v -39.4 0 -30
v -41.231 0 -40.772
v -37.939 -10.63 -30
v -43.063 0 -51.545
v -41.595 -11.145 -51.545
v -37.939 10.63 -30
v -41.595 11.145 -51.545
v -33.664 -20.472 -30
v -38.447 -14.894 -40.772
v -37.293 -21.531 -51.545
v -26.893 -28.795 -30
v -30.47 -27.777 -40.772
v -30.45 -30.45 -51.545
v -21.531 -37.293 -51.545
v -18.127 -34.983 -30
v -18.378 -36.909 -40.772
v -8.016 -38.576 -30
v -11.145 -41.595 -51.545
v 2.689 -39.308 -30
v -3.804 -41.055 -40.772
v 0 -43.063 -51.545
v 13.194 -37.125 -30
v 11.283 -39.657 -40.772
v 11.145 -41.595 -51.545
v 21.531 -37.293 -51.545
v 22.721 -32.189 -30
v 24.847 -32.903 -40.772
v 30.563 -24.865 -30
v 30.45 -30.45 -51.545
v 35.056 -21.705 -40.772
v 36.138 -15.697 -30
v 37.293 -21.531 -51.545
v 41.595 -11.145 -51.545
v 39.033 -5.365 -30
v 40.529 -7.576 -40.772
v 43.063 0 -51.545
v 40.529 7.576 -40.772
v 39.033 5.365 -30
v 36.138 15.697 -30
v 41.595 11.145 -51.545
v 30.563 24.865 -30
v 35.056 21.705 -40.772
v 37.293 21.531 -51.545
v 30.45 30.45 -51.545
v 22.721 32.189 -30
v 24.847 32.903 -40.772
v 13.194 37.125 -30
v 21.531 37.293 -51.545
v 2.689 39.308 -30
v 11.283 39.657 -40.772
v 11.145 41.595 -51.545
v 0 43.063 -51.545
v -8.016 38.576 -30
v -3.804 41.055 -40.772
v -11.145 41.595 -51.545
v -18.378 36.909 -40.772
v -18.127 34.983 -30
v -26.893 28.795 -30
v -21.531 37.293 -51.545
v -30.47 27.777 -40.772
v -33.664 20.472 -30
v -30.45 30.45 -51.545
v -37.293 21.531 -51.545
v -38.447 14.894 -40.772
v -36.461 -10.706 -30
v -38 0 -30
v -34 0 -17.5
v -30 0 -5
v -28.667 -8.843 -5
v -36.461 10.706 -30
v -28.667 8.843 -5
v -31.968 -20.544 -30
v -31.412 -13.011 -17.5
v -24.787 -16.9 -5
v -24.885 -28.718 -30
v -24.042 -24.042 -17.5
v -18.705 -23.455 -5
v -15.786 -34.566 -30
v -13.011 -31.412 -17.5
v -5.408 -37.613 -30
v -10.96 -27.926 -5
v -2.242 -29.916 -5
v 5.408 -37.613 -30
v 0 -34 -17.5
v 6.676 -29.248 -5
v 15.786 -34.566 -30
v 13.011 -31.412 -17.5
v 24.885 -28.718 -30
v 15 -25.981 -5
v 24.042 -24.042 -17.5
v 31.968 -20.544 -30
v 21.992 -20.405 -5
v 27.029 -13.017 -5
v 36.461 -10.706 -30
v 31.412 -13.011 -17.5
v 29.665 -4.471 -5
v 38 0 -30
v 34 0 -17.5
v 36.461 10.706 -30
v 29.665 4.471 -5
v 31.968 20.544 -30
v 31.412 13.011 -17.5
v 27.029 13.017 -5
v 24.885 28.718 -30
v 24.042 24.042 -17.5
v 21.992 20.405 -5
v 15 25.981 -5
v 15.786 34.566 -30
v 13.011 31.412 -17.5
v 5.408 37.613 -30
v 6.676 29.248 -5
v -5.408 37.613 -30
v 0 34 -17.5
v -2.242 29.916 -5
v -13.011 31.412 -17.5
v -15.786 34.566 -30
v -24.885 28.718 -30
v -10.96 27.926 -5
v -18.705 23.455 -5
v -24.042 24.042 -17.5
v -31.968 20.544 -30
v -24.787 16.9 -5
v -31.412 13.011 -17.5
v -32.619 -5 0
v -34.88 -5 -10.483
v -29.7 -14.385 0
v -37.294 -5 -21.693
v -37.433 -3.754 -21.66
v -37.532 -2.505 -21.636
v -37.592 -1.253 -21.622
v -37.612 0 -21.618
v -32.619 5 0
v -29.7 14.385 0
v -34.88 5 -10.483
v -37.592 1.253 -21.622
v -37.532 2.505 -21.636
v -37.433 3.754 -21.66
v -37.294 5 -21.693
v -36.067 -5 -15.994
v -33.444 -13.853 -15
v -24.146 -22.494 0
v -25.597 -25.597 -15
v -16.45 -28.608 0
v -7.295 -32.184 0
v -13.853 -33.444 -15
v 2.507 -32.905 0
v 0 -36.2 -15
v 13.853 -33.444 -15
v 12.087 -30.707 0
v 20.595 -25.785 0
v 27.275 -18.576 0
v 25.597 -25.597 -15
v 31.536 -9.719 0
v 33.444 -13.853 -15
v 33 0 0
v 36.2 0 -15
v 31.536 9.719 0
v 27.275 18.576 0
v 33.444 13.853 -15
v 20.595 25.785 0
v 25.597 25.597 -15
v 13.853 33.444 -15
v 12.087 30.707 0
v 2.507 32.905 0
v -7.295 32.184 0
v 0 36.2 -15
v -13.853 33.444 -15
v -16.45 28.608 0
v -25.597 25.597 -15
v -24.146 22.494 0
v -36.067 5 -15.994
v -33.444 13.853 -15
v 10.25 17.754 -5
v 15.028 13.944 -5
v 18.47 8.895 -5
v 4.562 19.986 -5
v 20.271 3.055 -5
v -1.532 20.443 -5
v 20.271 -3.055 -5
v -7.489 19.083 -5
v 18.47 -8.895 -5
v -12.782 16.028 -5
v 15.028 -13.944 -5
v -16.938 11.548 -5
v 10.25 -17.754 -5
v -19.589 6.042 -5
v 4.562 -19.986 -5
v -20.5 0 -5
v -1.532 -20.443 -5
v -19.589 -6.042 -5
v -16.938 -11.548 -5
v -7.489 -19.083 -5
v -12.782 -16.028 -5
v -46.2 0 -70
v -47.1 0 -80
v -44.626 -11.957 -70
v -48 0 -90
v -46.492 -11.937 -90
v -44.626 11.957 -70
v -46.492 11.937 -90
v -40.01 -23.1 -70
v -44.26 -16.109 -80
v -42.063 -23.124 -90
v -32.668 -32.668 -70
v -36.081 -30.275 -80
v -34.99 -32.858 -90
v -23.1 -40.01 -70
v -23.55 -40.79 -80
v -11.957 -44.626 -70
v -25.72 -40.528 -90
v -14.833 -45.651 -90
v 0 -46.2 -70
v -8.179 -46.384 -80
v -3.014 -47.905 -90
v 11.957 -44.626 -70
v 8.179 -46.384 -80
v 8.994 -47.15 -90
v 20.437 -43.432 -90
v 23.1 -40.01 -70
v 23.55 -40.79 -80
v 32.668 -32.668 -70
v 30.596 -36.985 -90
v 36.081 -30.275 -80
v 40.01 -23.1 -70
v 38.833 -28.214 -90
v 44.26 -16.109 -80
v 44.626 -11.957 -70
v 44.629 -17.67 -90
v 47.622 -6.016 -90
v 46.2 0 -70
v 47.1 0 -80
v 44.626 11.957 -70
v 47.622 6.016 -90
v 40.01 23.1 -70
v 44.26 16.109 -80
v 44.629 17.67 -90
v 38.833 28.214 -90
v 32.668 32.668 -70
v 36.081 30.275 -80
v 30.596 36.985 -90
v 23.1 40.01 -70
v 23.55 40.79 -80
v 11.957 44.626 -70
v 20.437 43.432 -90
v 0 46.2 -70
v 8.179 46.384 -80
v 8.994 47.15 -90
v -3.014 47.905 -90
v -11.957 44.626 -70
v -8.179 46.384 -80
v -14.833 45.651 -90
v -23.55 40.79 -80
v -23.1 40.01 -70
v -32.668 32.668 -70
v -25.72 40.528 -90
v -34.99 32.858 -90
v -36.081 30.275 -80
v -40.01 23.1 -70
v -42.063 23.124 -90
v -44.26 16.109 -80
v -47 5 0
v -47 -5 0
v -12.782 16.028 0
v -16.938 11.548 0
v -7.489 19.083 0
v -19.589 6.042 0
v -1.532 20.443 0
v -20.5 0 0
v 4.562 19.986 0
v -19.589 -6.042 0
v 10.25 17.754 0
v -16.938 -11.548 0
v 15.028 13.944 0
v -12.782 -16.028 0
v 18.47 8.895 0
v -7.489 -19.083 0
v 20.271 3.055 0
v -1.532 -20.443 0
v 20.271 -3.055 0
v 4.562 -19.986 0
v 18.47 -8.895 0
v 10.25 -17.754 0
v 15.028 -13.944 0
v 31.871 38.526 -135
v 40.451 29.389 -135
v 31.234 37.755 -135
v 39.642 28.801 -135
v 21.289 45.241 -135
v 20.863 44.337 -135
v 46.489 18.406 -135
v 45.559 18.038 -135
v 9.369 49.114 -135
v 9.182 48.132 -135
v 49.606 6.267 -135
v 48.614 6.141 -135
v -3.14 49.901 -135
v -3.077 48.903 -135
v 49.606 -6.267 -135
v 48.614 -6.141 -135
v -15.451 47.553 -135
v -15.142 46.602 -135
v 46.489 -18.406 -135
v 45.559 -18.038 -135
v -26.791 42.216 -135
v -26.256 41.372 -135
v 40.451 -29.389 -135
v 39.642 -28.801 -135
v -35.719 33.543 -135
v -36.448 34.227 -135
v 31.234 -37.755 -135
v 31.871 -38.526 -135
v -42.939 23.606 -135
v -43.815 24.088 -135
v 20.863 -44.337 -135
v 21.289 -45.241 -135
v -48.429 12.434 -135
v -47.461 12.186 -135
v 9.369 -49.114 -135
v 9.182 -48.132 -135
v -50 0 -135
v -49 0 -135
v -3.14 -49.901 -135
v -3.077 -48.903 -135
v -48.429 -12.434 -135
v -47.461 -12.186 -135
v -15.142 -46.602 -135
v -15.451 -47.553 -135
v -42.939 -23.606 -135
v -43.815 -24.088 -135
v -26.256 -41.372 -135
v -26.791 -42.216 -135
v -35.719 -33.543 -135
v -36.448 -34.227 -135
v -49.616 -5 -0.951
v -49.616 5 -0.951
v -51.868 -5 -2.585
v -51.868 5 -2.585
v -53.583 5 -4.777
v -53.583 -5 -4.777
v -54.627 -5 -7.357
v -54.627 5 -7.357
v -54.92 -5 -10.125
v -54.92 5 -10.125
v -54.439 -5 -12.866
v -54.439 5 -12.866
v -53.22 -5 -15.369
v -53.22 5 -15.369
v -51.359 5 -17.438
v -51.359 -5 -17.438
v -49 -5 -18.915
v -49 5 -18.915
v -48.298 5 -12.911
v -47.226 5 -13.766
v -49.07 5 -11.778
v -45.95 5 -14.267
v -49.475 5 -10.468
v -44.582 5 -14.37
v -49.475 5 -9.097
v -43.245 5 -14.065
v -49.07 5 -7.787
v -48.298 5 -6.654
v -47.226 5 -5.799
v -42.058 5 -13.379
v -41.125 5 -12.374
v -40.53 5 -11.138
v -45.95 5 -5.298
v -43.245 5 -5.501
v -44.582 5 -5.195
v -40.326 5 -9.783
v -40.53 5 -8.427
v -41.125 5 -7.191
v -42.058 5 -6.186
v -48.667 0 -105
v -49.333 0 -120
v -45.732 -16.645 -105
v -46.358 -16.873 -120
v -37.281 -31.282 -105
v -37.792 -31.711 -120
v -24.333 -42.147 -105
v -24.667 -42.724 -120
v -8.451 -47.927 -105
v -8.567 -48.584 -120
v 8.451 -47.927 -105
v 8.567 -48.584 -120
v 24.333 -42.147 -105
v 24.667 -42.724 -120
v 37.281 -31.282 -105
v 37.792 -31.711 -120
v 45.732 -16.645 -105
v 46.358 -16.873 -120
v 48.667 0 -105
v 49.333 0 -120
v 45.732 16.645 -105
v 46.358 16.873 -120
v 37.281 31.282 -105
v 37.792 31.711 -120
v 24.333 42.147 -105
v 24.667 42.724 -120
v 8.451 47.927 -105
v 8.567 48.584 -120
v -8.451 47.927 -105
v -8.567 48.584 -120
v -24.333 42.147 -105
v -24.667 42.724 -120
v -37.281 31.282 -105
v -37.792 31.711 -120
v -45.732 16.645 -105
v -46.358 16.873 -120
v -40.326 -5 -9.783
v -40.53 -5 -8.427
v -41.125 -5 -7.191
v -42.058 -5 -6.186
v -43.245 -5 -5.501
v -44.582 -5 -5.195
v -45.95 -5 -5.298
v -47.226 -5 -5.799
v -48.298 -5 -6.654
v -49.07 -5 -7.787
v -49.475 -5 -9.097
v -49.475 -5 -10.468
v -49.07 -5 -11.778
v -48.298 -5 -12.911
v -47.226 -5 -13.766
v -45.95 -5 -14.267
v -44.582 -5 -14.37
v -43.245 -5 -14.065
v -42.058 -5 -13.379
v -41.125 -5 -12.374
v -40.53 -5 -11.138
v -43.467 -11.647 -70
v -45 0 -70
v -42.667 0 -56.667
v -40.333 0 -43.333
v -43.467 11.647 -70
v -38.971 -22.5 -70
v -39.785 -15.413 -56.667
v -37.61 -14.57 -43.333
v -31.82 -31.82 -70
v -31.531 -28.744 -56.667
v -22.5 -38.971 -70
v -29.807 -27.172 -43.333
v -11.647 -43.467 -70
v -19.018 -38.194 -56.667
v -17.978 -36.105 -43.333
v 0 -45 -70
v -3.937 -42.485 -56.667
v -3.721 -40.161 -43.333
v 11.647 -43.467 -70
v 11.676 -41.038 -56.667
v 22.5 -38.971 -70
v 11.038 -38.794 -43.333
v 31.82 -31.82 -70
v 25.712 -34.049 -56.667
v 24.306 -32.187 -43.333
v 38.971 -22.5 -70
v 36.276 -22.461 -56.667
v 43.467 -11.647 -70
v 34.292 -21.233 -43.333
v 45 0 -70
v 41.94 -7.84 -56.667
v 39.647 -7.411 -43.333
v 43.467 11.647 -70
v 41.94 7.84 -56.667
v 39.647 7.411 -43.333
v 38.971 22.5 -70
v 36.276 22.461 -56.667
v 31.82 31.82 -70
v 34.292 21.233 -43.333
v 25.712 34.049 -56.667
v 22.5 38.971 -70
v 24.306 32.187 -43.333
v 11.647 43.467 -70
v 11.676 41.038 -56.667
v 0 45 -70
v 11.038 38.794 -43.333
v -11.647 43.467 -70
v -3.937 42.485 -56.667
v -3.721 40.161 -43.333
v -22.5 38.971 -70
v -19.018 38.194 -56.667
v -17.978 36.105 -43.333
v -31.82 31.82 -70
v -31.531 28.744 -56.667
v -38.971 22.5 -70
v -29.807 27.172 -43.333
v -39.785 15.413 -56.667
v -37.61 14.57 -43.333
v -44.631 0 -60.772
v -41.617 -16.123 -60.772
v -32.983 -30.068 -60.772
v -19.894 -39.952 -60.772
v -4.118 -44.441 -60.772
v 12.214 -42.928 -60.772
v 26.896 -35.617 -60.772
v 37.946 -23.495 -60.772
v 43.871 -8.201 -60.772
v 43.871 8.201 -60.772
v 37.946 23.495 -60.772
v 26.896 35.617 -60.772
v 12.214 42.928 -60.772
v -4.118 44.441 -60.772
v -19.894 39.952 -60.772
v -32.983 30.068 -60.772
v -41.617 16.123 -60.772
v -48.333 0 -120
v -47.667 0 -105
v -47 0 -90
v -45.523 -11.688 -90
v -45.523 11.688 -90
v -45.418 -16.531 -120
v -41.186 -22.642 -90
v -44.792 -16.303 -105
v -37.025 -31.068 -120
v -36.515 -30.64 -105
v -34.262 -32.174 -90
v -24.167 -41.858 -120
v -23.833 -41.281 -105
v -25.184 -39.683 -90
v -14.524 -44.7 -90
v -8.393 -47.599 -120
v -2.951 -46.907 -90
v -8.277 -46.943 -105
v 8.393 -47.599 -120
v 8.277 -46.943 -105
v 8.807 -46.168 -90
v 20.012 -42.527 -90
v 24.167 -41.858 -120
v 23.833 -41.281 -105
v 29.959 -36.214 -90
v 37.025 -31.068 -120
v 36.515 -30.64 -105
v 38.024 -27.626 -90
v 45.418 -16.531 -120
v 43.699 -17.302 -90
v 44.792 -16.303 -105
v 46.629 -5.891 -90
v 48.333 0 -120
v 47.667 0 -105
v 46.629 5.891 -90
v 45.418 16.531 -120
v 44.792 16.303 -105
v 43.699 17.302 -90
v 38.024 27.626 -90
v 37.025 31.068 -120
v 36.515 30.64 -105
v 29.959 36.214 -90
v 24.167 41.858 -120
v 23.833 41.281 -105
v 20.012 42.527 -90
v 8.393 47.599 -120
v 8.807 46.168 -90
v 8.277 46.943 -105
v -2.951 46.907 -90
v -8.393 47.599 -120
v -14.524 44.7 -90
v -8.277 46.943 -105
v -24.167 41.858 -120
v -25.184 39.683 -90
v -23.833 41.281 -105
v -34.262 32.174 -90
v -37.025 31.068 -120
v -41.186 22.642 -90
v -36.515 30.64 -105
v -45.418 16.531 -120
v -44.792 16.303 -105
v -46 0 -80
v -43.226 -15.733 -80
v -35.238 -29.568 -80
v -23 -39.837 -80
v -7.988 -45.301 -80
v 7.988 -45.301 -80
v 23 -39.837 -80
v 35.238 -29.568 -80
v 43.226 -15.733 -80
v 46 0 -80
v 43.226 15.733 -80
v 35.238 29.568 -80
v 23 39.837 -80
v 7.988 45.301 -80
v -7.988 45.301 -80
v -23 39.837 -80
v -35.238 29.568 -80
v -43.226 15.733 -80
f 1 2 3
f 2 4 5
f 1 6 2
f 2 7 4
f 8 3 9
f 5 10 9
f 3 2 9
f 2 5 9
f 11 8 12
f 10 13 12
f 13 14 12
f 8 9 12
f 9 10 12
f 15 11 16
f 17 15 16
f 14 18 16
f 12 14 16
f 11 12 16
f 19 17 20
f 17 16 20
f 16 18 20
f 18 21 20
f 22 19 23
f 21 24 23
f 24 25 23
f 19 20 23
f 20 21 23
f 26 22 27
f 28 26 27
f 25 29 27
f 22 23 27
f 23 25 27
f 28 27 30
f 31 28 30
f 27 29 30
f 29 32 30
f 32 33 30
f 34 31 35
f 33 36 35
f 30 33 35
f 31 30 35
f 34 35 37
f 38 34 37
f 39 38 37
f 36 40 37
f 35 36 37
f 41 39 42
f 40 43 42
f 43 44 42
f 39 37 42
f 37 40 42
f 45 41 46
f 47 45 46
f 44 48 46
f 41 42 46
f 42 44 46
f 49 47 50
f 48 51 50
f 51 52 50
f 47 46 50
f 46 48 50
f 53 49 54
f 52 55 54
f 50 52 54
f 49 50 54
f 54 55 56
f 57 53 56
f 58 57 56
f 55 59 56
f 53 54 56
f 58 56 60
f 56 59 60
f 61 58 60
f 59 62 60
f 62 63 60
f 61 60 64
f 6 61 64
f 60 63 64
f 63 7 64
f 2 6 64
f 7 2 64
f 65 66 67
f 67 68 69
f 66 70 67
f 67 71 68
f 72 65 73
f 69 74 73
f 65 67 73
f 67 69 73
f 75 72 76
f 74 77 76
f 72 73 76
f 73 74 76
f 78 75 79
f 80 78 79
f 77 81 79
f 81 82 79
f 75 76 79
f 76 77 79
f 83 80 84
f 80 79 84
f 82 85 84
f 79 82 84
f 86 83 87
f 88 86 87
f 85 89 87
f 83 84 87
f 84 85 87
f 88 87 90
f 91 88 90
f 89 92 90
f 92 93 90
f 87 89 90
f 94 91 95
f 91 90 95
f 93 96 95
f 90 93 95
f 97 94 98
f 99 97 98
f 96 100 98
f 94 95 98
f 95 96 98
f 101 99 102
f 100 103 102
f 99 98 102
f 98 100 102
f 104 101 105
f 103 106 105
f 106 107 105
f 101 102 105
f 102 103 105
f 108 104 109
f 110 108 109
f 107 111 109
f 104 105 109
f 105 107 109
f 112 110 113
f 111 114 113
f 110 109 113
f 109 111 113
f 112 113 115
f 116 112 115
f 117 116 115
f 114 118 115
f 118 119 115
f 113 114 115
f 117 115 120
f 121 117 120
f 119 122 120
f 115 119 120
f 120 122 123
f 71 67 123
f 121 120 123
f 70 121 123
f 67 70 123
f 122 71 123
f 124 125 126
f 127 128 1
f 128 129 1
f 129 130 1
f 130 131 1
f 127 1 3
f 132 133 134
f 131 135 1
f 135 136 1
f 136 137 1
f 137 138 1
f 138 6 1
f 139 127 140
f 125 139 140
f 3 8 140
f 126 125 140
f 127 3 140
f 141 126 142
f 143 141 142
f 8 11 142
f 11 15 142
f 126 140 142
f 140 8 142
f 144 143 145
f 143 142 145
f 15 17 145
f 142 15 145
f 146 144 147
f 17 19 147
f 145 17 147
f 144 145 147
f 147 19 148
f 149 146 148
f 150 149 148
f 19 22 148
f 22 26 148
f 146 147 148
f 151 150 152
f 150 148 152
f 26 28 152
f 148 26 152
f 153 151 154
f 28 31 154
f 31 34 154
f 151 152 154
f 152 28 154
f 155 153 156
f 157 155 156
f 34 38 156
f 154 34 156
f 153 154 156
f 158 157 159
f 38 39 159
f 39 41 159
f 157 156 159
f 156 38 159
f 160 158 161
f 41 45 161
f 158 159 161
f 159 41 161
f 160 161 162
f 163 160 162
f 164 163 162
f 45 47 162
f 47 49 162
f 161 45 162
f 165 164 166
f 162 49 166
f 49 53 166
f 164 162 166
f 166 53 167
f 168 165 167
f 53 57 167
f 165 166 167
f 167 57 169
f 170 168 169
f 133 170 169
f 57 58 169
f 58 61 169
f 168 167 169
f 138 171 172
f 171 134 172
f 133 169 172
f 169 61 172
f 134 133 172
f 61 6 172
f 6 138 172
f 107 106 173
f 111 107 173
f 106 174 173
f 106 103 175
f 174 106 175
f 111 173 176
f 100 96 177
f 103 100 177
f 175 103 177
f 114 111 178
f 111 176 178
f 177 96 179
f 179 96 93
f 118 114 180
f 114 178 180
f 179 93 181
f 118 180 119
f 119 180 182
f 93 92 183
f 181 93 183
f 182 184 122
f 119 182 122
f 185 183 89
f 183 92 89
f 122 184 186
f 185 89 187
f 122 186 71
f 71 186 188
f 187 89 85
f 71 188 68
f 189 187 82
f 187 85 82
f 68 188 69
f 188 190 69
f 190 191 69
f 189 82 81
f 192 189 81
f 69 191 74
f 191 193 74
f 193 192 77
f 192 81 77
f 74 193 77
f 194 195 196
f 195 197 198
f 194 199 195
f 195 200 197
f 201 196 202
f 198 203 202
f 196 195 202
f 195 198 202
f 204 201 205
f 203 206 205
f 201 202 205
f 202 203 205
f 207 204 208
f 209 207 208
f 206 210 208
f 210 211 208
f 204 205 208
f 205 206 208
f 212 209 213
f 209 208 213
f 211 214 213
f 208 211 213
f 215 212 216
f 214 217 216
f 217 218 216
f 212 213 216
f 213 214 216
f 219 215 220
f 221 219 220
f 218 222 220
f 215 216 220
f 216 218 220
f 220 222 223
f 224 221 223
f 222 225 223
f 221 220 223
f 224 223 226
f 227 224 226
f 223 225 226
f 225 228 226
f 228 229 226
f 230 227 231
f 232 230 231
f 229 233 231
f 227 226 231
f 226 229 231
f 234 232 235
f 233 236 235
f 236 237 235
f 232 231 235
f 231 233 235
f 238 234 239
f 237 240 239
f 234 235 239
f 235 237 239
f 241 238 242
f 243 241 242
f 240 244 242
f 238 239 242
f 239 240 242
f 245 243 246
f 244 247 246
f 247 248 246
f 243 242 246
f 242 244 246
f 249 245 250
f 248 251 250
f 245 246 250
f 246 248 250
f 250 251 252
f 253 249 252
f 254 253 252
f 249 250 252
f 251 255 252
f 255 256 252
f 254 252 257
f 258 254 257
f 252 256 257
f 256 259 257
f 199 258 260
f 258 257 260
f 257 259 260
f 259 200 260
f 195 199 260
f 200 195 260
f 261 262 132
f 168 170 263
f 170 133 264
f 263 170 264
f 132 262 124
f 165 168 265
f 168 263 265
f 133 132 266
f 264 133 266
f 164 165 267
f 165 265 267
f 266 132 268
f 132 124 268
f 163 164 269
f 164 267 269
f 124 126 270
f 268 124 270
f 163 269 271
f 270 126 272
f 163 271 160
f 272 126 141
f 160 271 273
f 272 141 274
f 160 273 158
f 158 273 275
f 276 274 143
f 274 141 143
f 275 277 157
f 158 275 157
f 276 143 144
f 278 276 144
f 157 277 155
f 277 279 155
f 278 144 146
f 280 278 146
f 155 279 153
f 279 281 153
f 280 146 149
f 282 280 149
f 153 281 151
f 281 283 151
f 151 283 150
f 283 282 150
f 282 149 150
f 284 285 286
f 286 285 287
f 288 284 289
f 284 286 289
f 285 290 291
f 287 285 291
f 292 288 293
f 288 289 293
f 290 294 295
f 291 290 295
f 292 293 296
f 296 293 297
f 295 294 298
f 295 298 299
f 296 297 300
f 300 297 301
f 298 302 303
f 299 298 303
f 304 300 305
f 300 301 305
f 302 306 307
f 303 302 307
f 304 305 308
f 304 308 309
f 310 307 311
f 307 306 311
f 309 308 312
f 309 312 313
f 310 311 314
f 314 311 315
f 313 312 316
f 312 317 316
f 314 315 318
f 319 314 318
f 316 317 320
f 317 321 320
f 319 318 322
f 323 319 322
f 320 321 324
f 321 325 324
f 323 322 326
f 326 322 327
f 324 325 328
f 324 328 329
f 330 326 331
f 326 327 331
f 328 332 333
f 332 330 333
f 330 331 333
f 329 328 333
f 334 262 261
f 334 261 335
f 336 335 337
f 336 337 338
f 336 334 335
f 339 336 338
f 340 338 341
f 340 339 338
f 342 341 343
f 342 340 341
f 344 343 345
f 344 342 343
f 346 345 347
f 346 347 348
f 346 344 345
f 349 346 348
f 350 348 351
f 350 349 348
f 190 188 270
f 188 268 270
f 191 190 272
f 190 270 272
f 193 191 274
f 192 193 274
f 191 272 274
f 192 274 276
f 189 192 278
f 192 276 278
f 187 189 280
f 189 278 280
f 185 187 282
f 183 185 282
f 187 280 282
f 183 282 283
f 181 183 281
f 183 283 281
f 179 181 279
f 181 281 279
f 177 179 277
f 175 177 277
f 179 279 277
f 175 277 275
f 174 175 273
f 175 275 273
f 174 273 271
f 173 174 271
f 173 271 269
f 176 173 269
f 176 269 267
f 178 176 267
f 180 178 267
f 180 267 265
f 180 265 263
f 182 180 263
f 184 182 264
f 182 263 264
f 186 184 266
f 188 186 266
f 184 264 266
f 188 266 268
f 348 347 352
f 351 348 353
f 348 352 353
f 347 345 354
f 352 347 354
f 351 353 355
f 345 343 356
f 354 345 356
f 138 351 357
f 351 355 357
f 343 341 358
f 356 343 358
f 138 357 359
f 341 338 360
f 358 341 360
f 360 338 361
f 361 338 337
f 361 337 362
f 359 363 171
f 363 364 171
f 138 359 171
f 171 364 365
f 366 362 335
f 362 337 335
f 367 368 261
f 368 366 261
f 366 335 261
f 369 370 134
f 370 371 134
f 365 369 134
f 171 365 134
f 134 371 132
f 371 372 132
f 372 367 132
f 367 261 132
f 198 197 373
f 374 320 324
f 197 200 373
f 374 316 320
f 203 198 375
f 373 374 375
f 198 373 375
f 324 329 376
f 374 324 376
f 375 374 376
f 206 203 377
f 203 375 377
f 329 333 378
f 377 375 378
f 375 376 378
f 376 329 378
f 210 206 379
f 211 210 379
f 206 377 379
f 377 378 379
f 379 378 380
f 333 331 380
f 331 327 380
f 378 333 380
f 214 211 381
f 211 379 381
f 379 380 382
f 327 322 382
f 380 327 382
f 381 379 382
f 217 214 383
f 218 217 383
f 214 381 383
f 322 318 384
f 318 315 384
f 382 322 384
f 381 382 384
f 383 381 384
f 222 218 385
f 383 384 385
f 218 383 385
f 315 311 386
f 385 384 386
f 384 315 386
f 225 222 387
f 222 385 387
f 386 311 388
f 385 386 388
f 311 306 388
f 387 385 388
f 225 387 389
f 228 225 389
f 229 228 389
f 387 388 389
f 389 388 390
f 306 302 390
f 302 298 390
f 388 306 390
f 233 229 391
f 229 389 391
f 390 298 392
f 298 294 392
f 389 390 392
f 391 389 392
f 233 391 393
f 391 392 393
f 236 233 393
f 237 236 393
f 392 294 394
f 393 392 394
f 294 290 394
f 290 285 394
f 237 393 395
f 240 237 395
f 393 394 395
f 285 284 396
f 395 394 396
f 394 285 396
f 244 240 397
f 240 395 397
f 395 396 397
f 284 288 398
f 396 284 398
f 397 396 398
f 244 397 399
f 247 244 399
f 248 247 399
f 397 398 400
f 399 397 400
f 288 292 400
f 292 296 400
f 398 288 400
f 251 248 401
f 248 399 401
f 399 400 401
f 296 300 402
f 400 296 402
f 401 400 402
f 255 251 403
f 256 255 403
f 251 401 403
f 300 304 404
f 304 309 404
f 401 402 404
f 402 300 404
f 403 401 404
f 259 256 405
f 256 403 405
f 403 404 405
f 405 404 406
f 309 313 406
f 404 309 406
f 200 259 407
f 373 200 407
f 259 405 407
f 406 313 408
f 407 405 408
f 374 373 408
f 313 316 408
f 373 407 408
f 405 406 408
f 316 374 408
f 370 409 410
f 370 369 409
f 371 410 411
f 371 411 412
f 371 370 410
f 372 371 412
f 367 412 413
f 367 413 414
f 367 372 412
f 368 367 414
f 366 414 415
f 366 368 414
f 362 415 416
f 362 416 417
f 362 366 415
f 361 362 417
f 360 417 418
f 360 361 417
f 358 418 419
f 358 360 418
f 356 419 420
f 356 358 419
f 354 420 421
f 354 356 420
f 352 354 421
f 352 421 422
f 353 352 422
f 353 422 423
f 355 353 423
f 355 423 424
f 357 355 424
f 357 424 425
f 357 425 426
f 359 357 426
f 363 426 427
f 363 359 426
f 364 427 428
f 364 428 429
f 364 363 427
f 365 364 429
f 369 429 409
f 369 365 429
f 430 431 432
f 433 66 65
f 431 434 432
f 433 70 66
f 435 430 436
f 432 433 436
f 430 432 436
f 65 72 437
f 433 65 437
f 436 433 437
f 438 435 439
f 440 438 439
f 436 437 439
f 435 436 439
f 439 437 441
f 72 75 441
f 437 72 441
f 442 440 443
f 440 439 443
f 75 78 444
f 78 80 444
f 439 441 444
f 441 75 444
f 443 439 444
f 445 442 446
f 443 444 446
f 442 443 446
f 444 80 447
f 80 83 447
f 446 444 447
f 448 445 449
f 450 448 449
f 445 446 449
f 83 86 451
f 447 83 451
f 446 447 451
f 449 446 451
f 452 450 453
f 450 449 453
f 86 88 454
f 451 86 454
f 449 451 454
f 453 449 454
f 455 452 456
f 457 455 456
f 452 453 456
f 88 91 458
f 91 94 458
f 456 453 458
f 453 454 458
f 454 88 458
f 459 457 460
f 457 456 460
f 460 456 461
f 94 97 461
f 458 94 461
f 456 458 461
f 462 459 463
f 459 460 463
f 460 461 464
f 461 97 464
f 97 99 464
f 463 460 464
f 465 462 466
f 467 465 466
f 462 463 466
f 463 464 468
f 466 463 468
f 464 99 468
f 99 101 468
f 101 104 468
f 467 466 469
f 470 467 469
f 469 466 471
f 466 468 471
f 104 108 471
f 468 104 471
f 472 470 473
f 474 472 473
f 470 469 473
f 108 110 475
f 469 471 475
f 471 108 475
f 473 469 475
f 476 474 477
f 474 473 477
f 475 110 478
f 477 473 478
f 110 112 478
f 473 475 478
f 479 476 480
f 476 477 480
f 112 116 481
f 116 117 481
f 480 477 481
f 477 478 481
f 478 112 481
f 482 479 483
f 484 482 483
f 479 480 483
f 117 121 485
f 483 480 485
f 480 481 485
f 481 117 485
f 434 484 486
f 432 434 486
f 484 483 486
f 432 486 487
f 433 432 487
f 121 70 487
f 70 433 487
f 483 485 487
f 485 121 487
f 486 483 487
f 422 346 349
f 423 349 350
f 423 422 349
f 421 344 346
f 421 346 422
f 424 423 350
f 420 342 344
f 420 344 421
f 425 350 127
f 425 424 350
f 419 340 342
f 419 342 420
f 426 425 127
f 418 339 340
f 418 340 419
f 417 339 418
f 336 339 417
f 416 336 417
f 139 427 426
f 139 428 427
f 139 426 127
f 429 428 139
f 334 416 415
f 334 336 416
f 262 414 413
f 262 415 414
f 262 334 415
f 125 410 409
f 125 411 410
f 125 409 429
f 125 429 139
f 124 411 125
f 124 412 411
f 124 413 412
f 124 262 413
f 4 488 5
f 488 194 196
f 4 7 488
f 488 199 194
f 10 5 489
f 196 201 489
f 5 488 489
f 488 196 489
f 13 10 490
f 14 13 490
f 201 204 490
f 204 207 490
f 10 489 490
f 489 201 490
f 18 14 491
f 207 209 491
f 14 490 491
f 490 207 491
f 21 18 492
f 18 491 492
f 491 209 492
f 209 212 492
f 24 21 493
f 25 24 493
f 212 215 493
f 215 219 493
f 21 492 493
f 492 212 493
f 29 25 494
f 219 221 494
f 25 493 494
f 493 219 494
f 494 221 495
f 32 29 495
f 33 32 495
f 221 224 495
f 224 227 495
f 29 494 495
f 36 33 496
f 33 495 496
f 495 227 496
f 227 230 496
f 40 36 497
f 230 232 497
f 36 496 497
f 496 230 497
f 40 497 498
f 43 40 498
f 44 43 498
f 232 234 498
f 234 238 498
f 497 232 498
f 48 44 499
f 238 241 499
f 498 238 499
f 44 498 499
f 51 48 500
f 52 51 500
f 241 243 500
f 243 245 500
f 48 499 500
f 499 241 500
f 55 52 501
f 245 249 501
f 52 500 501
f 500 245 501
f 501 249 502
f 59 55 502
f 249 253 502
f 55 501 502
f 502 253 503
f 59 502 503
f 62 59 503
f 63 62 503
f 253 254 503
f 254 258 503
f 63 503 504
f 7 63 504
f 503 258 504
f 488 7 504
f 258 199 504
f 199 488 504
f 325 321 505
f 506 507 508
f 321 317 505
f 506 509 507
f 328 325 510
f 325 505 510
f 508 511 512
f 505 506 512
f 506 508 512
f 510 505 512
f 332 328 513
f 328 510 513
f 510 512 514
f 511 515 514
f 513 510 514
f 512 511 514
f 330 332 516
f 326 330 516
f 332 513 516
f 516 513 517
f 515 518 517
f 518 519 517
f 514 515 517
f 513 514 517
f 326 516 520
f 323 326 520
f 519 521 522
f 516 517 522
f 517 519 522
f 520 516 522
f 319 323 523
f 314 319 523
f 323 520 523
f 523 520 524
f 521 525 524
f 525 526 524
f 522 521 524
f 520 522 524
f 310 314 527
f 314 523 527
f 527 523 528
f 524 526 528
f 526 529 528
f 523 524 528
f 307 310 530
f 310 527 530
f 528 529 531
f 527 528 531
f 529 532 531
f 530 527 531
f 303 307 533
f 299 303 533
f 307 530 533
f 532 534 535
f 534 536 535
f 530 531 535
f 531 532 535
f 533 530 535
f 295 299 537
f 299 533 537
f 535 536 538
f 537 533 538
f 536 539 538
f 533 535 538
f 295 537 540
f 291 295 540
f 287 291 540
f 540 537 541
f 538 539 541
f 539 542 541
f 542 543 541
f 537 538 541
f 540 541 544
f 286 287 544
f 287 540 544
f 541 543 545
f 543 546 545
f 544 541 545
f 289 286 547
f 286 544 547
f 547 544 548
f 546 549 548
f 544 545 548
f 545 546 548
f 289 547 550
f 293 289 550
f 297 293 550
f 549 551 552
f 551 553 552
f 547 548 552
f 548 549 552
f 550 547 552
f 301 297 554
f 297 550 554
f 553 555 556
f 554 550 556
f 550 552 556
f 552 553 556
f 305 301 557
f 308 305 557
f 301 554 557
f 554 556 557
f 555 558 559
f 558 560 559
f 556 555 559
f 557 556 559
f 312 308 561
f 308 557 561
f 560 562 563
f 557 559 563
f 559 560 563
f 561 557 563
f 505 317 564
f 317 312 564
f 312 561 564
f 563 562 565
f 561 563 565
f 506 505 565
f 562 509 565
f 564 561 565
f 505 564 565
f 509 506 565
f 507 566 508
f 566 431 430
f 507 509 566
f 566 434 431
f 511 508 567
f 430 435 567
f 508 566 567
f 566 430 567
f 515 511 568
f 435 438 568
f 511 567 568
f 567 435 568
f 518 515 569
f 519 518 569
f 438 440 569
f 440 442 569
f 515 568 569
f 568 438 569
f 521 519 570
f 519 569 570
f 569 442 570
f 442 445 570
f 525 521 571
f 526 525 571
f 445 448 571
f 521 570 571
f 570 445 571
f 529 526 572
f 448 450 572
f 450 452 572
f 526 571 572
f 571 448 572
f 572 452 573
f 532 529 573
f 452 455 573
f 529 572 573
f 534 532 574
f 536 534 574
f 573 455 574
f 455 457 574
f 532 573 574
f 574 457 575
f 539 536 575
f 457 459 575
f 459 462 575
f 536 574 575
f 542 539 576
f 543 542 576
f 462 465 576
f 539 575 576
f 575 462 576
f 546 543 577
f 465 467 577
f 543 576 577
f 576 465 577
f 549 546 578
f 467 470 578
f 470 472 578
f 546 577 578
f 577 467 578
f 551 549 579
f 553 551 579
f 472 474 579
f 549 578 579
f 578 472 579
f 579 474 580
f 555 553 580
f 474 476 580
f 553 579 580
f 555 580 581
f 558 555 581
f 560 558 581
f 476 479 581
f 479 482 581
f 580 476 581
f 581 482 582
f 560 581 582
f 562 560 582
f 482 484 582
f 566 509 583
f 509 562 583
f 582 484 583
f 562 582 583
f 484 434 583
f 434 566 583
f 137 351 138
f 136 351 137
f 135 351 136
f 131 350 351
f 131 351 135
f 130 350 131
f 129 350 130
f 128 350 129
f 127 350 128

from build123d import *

# Parameters (mm, degrees)
SKETCH002_R    = 4.6
PAD_DEPTH      = 5
PAD_DEPTH_BACK = 5


with BuildPart() as pad:
    # Sketch002 → Pad (new body, two sides)
    with BuildSketch(Plane.XZ) as pad_sk:
        with BuildLine():
            Line((-30, 0), (-47, 0))
            ThreePointArc((-47, 0), (-54.870528, -8.731056), (-49, -18.915037))
            Line((-49, -18.915037), (-36, -22))
            Line((-36, -22), (-30, 0))
        make_face()
        with Locations((-44.925964, -9.782555)):
            Circle(SKETCH002_R, mode=Mode.SUBTRACT)
    extrude(amount=PAD_DEPTH)
    extrude(pad_sk.sketch, amount=-PAD_DEPTH_BACK)


with BuildPart() as fusion:
    # Sketch001 → Revolution (revolve)
    with BuildSketch(Plane.XZ):
        Polygon((-20.5, 0), (-33, 0), (-39.4, -30), (-43.062567, -51.544511), (-46.2, -70), (-48, -90), (-50, -135), (-49, -135), (-47, -90), (-45, -70), (-38, -30), (-30, -5), (-20.5, -5), align=None)
    revolve(axis=Axis((0, 0, 0), (0, 0, 1)))

    # Fusion: union Pad
    add(pad.part)


solid = fusion.part
